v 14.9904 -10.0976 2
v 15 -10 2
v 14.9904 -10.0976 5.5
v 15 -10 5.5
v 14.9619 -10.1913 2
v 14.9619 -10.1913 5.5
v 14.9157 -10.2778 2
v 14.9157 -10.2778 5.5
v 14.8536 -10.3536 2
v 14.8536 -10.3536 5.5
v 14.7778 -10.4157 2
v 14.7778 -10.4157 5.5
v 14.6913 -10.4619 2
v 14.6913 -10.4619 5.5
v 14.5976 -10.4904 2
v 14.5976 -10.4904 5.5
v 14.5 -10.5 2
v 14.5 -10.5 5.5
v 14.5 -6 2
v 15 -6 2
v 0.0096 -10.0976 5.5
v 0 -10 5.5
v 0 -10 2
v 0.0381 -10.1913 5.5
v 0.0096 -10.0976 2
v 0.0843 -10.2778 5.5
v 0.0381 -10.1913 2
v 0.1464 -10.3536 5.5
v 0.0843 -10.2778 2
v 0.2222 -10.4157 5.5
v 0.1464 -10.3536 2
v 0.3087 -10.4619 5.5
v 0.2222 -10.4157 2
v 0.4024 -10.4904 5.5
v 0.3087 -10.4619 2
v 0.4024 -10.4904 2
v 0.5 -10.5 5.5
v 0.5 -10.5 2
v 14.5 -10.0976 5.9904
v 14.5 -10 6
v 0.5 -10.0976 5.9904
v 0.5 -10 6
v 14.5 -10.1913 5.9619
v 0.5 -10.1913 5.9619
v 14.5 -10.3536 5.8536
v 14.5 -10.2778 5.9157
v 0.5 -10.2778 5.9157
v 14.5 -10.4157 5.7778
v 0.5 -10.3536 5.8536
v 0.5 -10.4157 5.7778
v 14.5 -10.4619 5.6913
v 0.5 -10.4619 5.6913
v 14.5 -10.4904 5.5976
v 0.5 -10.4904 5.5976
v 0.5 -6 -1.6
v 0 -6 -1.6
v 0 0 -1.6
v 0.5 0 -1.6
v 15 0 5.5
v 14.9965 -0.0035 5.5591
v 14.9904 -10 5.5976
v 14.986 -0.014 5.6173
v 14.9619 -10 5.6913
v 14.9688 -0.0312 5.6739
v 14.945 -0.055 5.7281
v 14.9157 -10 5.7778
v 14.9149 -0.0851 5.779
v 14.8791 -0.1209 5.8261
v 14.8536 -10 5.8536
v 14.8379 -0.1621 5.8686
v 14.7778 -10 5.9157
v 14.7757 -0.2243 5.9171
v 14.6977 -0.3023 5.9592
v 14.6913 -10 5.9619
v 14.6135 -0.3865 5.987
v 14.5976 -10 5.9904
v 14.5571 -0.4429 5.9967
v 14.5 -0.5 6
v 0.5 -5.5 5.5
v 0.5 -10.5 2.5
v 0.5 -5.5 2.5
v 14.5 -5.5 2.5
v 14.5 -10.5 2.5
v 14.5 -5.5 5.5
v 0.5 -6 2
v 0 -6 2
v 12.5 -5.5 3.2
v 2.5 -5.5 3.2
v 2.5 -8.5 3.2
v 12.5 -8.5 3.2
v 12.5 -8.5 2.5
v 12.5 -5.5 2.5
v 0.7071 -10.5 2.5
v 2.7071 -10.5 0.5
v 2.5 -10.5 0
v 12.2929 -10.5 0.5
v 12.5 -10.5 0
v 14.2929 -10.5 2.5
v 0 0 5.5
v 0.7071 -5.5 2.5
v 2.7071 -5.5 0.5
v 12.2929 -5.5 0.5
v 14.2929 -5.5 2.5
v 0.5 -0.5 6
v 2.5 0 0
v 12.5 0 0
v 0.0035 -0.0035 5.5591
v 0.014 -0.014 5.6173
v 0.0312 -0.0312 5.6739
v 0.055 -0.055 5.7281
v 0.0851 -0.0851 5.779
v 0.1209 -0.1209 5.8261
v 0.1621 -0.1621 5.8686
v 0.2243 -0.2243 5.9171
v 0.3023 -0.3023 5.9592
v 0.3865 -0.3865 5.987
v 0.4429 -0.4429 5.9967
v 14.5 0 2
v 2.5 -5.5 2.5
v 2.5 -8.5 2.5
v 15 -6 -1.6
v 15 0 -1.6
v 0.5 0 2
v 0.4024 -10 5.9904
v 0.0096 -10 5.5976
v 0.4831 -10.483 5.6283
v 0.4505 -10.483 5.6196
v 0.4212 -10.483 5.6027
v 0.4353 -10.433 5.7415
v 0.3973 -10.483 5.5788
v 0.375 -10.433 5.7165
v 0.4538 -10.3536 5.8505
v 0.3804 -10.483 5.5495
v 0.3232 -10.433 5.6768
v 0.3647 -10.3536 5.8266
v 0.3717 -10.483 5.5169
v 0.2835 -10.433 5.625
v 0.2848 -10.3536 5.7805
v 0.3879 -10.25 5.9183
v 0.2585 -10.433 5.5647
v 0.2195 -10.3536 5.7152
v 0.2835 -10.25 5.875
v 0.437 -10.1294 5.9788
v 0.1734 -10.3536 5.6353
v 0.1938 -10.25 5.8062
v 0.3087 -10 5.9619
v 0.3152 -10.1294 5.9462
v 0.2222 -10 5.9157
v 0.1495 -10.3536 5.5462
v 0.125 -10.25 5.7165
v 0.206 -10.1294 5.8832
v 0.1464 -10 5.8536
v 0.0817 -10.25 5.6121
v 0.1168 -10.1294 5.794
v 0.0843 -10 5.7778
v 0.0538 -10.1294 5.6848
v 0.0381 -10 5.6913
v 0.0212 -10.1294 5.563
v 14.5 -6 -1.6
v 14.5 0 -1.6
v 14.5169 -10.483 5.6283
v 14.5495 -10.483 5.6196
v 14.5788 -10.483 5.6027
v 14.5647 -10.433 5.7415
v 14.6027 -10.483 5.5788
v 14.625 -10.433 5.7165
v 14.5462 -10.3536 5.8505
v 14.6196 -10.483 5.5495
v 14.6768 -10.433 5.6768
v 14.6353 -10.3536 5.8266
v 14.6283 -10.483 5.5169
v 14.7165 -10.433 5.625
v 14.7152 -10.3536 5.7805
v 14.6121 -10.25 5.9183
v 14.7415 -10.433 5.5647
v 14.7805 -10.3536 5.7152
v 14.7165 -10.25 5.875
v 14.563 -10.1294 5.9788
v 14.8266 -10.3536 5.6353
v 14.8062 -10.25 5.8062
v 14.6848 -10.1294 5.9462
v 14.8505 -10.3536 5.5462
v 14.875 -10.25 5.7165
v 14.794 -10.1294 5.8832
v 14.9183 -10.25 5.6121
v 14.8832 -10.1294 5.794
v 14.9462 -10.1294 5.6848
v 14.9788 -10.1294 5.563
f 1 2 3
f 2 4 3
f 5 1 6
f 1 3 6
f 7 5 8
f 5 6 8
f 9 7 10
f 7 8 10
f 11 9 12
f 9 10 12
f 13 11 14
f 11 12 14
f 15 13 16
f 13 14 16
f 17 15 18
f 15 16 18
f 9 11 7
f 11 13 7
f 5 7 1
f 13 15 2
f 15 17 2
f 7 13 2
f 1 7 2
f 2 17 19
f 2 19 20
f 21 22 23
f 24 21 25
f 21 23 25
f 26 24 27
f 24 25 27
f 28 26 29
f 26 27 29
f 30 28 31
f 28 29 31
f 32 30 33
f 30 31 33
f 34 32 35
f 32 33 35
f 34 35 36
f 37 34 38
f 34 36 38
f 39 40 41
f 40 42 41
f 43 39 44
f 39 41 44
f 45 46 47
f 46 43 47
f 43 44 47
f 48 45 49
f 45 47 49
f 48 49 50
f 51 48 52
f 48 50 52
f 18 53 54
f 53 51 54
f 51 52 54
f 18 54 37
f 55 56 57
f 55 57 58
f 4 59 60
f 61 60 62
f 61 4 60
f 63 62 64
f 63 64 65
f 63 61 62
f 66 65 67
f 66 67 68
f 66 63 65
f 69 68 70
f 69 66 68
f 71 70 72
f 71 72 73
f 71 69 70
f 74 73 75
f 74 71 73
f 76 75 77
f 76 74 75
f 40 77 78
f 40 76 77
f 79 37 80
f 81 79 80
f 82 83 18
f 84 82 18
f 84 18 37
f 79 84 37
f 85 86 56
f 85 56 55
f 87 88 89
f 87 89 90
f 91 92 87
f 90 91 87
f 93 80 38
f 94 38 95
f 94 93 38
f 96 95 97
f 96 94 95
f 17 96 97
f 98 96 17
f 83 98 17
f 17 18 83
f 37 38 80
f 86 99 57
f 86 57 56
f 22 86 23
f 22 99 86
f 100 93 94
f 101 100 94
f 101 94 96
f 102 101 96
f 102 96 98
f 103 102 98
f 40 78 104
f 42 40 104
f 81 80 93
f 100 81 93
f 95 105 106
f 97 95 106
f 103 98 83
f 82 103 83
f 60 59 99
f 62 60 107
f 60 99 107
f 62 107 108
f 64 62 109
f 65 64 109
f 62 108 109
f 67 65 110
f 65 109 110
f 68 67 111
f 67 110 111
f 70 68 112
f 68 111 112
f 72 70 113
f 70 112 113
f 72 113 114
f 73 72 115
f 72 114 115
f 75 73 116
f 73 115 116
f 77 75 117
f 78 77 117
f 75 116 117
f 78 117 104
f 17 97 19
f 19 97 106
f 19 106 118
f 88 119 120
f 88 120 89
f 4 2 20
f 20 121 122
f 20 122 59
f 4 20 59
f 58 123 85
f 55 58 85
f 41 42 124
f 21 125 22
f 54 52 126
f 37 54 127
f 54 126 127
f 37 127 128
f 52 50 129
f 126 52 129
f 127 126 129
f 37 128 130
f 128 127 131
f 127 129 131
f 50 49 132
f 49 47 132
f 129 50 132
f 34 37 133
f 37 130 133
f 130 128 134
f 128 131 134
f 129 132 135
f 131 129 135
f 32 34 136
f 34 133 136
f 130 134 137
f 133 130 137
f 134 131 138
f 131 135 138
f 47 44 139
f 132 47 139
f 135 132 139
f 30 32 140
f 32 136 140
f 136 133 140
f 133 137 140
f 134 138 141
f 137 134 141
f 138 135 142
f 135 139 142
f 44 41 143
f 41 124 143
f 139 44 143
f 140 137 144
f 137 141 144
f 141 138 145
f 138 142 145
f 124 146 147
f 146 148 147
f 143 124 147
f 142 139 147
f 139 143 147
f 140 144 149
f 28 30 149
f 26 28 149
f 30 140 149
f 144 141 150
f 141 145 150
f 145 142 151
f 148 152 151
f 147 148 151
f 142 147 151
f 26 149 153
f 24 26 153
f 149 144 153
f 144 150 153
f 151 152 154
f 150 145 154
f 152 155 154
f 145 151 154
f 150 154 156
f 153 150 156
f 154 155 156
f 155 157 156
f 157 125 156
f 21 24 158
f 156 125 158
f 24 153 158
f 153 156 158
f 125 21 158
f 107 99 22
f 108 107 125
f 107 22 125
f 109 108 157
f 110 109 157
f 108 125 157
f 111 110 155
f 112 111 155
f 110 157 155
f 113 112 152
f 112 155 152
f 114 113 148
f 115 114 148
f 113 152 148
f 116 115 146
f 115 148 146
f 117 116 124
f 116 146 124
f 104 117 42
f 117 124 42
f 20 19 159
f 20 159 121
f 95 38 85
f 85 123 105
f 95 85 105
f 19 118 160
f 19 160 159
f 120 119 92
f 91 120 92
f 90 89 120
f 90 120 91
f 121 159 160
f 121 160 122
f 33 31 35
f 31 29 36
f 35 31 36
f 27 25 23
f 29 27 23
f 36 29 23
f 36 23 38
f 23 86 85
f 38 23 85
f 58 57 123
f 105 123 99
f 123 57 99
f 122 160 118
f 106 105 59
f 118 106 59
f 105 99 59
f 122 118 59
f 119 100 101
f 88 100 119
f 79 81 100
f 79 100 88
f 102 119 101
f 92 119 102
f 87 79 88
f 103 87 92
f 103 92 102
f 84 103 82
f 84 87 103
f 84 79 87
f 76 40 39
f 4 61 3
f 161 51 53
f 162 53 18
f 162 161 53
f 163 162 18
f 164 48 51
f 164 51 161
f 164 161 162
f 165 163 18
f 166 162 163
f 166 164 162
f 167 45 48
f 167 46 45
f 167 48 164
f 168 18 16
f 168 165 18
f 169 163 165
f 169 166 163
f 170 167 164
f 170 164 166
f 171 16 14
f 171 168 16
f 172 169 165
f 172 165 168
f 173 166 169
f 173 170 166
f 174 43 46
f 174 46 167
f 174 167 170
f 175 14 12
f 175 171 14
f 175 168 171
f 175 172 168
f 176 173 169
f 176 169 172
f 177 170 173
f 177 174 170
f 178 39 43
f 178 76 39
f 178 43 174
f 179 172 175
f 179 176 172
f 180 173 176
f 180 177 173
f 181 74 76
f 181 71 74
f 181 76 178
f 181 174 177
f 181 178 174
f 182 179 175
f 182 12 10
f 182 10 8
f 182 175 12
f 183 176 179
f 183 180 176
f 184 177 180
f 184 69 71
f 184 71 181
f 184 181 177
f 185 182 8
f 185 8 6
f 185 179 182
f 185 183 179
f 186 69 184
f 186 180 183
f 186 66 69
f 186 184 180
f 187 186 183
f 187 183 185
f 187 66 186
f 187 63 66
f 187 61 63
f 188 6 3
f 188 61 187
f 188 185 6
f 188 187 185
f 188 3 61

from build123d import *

# Parameters (mm, degrees)
F1_DEPTH = 10.5
F3_DEPTH = 5
F4_W     = 10
F4_H     = 0.7
F5_DEPTH = 3
F6_W     = 0.5
F6_H     = 6
F7_DEPTH = 3.6
F8_R     = 0.49999


# Not quite as in the source:
# - a fillet or chamfer is up to 0.001 mm smaller than in the source, because OpenCascade refuses the exact size


with BuildPart() as f1:
    # F0 (on Front) → F1 (new body)
    with BuildSketch(Plane.XZ):
        Polygon((15, 6), (0, 6), (0, 2), (0.5, 2), (2.5, 0), (12.5, 0), (14.5, 2), (15, 2), align=None)
    extrude(amount=F1_DEPTH)

    # F2 (on face) → F3 (cut)
    with BuildSketch(Plane.XZ.offset(10.5)):
        Polygon((14.5, 5.5), (0.5, 5.5), (0.5, 2.5), (0.7071067812, 2.5), (2.7071067812, 0.5), (12.2928932188, 0.5), (14.2928932188, 2.5), (14.5, 2.5), align=None)
    extrude(amount=-F3_DEPTH, mode=Mode.SUBTRACT)

    # F4 (on face) → F5 (join)
    with BuildSketch(Plane.XZ.offset(5.5)):
        with Locations((7.5, 2.85)):
            Rectangle(F4_W, F4_H)
    extrude(amount=F5_DEPTH)

    # F6 (on face) → F7 (join)
    with BuildSketch(Plane(origin=(0, 0, 2), x_dir=(1, 0, 0), z_dir=(0, 0, -1))):
        with Locations((0.25, 3)):
            Rectangle(F6_W, F6_H)
        with Locations((14.75, 3)):
            Rectangle(F6_W, F6_H)
    extrude(amount=F7_DEPTH)

    # F8 (radius 0.5 in the source; OpenCascade refuses exactly that, so slightly less here)
    f8_edges = [f1.edges().sort_by_distance(p)[0] for p in [
        (0, -5.25, 6),
        (7.5, 0, 6),
        (15, -5.25, 6),
        (7.5, -10.5, 6),
        (0, -10.5, 4),
        (15, -10.5, 4),
    ]]
    fillet(f8_edges, radius=F8_R)


solid = f1.part
